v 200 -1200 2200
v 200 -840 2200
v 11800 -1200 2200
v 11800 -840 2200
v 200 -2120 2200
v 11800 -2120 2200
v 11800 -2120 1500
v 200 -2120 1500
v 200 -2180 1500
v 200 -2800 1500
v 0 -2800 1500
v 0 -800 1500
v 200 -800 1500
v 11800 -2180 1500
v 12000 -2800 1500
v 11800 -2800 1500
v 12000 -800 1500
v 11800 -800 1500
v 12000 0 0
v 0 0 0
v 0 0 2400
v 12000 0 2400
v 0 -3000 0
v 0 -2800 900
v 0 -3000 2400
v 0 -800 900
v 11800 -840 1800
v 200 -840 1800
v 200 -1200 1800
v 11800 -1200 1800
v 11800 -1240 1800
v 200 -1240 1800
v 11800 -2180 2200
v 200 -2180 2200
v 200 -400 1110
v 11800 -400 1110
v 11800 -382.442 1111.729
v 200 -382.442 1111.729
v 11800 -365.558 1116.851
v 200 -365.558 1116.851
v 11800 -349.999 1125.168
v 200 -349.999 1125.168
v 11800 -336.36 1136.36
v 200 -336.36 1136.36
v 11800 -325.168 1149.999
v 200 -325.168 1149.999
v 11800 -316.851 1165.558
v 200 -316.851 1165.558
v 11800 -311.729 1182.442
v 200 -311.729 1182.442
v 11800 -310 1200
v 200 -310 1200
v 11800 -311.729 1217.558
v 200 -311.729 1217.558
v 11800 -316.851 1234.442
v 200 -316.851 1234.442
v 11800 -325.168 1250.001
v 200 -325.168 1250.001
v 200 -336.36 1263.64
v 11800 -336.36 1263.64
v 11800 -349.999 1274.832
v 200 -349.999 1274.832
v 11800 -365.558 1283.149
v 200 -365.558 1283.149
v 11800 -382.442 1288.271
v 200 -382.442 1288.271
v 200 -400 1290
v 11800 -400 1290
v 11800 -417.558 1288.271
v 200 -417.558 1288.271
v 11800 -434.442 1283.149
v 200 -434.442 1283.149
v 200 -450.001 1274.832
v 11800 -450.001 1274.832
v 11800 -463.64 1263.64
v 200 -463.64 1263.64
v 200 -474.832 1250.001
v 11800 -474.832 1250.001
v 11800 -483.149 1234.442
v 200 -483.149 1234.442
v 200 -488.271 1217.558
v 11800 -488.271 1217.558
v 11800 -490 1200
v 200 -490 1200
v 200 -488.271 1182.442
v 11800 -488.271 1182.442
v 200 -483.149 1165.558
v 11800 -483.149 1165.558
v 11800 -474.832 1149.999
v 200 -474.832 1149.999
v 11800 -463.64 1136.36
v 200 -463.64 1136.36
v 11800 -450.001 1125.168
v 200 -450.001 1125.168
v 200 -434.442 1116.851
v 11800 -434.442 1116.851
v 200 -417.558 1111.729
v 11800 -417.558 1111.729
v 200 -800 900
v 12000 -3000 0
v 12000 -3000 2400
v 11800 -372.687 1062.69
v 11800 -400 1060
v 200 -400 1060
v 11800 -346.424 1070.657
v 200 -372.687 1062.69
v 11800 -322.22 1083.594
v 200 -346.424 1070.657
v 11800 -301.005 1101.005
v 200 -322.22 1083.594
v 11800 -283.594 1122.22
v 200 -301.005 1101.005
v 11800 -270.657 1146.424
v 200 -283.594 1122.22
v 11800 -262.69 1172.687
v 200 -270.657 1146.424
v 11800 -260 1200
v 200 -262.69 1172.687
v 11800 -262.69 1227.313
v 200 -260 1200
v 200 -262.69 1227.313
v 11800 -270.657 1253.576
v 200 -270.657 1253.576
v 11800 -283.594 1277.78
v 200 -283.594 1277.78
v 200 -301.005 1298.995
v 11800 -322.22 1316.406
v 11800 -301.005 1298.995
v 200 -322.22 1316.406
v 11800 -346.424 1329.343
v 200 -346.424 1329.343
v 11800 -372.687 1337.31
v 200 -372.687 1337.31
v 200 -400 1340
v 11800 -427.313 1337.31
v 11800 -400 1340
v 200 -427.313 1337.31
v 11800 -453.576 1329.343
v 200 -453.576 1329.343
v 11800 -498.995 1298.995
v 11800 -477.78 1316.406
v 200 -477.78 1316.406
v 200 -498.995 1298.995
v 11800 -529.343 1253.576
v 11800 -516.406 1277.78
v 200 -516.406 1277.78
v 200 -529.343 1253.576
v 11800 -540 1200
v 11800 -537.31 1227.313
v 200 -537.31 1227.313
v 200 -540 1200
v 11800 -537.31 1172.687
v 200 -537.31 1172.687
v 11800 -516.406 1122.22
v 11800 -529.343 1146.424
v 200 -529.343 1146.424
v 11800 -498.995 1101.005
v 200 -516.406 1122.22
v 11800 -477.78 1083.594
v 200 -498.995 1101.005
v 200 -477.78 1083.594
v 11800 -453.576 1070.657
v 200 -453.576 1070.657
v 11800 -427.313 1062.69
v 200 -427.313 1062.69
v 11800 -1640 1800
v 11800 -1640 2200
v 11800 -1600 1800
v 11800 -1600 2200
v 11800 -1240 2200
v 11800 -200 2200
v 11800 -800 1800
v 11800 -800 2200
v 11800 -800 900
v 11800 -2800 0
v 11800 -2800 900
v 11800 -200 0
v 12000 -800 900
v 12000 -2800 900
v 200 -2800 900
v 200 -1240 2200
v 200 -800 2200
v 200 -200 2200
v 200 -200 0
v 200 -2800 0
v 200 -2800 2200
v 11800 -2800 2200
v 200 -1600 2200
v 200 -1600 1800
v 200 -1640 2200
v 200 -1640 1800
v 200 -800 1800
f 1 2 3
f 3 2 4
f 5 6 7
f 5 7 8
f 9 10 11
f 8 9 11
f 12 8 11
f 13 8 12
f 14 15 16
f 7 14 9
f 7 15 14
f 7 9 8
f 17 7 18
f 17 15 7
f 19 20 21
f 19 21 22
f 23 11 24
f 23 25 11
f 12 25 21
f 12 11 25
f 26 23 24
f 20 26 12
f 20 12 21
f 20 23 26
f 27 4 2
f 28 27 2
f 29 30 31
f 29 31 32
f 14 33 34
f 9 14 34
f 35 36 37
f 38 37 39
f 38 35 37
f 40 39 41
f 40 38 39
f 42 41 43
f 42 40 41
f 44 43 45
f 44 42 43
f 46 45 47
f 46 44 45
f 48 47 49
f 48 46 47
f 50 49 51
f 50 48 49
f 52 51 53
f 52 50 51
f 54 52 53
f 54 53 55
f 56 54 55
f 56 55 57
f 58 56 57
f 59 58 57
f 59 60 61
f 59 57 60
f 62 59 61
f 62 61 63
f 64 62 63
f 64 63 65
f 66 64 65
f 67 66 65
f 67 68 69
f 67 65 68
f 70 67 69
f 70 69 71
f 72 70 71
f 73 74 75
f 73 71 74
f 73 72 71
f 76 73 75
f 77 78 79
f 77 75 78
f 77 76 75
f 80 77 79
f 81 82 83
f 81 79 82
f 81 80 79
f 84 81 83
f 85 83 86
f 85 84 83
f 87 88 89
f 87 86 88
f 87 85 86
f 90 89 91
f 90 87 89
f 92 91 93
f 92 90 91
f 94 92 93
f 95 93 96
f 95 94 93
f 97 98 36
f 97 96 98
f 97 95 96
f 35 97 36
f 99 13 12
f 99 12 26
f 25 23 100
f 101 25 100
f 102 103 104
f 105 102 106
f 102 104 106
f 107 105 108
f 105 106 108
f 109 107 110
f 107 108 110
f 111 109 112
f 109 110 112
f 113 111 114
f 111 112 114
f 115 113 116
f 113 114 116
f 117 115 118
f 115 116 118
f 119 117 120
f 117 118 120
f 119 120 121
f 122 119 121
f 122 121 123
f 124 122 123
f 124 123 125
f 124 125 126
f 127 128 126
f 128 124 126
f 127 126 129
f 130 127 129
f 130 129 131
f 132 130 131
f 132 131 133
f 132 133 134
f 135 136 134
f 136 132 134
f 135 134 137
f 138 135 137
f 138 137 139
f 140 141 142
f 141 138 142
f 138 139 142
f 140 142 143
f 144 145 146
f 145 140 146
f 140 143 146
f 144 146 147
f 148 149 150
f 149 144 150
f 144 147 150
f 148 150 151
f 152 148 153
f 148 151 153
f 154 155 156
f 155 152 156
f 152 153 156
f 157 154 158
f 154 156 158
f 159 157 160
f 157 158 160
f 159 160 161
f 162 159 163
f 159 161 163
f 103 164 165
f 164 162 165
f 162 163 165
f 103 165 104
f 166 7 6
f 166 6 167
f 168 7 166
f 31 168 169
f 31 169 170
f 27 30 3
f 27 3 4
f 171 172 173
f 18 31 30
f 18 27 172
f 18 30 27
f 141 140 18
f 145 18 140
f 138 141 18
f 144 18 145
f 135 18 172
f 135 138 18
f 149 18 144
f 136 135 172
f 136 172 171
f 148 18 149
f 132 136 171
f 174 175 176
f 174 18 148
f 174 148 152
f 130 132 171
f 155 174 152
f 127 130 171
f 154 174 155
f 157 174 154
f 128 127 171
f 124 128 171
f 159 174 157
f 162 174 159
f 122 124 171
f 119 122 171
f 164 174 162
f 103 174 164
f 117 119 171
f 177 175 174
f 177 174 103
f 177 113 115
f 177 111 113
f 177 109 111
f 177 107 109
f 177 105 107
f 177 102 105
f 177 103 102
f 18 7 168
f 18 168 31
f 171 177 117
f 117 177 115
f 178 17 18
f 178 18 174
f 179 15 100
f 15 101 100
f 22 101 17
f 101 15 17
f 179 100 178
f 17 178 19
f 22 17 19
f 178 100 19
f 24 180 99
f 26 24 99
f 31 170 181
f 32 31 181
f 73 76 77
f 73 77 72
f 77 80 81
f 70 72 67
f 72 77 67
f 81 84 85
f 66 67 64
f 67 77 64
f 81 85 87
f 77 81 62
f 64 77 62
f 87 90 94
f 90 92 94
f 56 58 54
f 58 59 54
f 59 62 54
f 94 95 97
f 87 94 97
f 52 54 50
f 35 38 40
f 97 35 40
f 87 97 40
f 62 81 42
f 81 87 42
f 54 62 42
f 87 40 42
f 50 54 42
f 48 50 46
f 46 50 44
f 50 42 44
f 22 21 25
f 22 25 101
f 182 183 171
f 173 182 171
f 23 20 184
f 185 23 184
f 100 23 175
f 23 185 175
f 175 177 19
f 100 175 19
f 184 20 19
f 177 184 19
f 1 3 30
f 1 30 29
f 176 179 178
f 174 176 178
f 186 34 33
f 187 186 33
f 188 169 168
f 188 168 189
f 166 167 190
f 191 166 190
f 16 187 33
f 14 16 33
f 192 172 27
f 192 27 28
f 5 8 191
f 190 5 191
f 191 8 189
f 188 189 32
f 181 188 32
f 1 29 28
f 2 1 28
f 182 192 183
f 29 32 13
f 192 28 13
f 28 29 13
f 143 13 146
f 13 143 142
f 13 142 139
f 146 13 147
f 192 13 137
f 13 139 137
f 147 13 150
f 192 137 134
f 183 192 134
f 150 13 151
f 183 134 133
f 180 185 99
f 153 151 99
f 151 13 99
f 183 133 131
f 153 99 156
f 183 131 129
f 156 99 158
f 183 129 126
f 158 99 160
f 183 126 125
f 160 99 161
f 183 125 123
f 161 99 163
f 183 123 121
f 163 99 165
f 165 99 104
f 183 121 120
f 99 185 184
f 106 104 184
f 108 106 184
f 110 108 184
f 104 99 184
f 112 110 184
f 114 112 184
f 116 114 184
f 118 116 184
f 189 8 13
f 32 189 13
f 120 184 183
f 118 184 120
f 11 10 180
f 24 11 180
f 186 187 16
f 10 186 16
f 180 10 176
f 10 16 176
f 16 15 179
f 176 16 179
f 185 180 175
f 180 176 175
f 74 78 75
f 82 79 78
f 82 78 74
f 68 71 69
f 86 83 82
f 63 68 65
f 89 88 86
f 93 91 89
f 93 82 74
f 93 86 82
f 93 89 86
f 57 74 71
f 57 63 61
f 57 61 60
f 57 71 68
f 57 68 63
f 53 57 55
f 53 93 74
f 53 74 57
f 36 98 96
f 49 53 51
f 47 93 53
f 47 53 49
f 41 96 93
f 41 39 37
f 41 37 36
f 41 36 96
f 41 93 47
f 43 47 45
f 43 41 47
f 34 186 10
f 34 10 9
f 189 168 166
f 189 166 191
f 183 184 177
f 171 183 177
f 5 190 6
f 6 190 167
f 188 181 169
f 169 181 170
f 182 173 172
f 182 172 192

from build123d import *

# Parameters (mm, degrees)
SKETCH1_W           = 12000
SKETCH1_H           = 3000
SKETCH1_W_2         = 11600
SKETCH1_H_2         = 2600
BOSS_EXTRUDE1_DEPTH = 2400
SKETCH2_W           = 12000
SKETCH2_H           = 3000
BOSS_EXTRUDE2_DEPTH = 200
SKETCH3_W           = 11600
SKETCH3_H           = 60
BOSS_EXTRUDE3_DEPTH = 700
SKETCH4_W           = 11600
SKETCH4_H           = 40
BOSS_EXTRUDE4_DEPTH = 400
SKETCH5_W           = 600
SKETCH5_H           = 2000
CUT_EXTRUDE1_DEPTH  = 14169
SKETCH6_R           = 140
SKETCH6_R_2         = 90
BOSS_EXTRUDE5_DEPTH = 11662


with BuildPart() as part:
    # Sketch1 → Boss-Extrude1 (new body)
    with BuildSketch(Plane.XY):
        with Locations((6000, -1500)):
            Rectangle(SKETCH1_W, SKETCH1_H)
        with Locations((6000, -1500)):
            Rectangle(SKETCH1_W_2, SKETCH1_H_2, mode=Mode.SUBTRACT)
    extrude(amount=BOSS_EXTRUDE1_DEPTH)

    # Sketch2 → Boss-Extrude2 (add)
    with BuildSketch(Plane.XY.offset(2400)):
        with Locations((6000, -1500)):
            Rectangle(SKETCH2_W, SKETCH2_H)
    extrude(amount=-BOSS_EXTRUDE2_DEPTH)

    # Sketch3 → Boss-Extrude3 (add)
    with BuildSketch(Plane(origin=(0, 0, 2200), x_dir=(-1, 0, 0), z_dir=(0, 0, -1))):
        with Locations((-6000, -2150)):
            Rectangle(SKETCH3_W, SKETCH3_H)
    extrude(amount=BOSS_EXTRUDE3_DEPTH)

    # Sketch4 → Boss-Extrude4 (add)
    with BuildSketch(Plane(origin=(0, 0, 2200), x_dir=(-1, 0, 0), z_dir=(0, 0, -1))):
        with Locations((-6000, -1620)):
            Rectangle(SKETCH4_W, SKETCH4_H)
        with Locations((-6000, -1220)):
            Rectangle(SKETCH4_W, SKETCH4_H)
        with Locations((-6000, -820)):
            Rectangle(SKETCH4_W, SKETCH4_H)
    extrude(amount=BOSS_EXTRUDE4_DEPTH)

    # Sketch5 → Cut-Extrude1 (cut)
    with BuildSketch(Plane(origin=(12000, 0, 0), x_dir=(0, 0, -1), z_dir=(1, 0, 0))):
        with Locations((-1200, -1800)):
            Rectangle(SKETCH5_W, SKETCH5_H)
    extrude(amount=-CUT_EXTRUDE1_DEPTH, mode=Mode.SUBTRACT)

    # Sketch6 → Boss-Extrude5 (add)
    with BuildSketch(Plane(origin=(200, 0, 0), x_dir=(0, 0, -1), z_dir=(1, 0, 0))):
        with Locations((-1200, -400)):
            Circle(SKETCH6_R)
        with Locations((-1200, -400)):
            Circle(SKETCH6_R_2, mode=Mode.SUBTRACT)
    extrude(amount=BOSS_EXTRUDE5_DEPTH)


solid = part.part
